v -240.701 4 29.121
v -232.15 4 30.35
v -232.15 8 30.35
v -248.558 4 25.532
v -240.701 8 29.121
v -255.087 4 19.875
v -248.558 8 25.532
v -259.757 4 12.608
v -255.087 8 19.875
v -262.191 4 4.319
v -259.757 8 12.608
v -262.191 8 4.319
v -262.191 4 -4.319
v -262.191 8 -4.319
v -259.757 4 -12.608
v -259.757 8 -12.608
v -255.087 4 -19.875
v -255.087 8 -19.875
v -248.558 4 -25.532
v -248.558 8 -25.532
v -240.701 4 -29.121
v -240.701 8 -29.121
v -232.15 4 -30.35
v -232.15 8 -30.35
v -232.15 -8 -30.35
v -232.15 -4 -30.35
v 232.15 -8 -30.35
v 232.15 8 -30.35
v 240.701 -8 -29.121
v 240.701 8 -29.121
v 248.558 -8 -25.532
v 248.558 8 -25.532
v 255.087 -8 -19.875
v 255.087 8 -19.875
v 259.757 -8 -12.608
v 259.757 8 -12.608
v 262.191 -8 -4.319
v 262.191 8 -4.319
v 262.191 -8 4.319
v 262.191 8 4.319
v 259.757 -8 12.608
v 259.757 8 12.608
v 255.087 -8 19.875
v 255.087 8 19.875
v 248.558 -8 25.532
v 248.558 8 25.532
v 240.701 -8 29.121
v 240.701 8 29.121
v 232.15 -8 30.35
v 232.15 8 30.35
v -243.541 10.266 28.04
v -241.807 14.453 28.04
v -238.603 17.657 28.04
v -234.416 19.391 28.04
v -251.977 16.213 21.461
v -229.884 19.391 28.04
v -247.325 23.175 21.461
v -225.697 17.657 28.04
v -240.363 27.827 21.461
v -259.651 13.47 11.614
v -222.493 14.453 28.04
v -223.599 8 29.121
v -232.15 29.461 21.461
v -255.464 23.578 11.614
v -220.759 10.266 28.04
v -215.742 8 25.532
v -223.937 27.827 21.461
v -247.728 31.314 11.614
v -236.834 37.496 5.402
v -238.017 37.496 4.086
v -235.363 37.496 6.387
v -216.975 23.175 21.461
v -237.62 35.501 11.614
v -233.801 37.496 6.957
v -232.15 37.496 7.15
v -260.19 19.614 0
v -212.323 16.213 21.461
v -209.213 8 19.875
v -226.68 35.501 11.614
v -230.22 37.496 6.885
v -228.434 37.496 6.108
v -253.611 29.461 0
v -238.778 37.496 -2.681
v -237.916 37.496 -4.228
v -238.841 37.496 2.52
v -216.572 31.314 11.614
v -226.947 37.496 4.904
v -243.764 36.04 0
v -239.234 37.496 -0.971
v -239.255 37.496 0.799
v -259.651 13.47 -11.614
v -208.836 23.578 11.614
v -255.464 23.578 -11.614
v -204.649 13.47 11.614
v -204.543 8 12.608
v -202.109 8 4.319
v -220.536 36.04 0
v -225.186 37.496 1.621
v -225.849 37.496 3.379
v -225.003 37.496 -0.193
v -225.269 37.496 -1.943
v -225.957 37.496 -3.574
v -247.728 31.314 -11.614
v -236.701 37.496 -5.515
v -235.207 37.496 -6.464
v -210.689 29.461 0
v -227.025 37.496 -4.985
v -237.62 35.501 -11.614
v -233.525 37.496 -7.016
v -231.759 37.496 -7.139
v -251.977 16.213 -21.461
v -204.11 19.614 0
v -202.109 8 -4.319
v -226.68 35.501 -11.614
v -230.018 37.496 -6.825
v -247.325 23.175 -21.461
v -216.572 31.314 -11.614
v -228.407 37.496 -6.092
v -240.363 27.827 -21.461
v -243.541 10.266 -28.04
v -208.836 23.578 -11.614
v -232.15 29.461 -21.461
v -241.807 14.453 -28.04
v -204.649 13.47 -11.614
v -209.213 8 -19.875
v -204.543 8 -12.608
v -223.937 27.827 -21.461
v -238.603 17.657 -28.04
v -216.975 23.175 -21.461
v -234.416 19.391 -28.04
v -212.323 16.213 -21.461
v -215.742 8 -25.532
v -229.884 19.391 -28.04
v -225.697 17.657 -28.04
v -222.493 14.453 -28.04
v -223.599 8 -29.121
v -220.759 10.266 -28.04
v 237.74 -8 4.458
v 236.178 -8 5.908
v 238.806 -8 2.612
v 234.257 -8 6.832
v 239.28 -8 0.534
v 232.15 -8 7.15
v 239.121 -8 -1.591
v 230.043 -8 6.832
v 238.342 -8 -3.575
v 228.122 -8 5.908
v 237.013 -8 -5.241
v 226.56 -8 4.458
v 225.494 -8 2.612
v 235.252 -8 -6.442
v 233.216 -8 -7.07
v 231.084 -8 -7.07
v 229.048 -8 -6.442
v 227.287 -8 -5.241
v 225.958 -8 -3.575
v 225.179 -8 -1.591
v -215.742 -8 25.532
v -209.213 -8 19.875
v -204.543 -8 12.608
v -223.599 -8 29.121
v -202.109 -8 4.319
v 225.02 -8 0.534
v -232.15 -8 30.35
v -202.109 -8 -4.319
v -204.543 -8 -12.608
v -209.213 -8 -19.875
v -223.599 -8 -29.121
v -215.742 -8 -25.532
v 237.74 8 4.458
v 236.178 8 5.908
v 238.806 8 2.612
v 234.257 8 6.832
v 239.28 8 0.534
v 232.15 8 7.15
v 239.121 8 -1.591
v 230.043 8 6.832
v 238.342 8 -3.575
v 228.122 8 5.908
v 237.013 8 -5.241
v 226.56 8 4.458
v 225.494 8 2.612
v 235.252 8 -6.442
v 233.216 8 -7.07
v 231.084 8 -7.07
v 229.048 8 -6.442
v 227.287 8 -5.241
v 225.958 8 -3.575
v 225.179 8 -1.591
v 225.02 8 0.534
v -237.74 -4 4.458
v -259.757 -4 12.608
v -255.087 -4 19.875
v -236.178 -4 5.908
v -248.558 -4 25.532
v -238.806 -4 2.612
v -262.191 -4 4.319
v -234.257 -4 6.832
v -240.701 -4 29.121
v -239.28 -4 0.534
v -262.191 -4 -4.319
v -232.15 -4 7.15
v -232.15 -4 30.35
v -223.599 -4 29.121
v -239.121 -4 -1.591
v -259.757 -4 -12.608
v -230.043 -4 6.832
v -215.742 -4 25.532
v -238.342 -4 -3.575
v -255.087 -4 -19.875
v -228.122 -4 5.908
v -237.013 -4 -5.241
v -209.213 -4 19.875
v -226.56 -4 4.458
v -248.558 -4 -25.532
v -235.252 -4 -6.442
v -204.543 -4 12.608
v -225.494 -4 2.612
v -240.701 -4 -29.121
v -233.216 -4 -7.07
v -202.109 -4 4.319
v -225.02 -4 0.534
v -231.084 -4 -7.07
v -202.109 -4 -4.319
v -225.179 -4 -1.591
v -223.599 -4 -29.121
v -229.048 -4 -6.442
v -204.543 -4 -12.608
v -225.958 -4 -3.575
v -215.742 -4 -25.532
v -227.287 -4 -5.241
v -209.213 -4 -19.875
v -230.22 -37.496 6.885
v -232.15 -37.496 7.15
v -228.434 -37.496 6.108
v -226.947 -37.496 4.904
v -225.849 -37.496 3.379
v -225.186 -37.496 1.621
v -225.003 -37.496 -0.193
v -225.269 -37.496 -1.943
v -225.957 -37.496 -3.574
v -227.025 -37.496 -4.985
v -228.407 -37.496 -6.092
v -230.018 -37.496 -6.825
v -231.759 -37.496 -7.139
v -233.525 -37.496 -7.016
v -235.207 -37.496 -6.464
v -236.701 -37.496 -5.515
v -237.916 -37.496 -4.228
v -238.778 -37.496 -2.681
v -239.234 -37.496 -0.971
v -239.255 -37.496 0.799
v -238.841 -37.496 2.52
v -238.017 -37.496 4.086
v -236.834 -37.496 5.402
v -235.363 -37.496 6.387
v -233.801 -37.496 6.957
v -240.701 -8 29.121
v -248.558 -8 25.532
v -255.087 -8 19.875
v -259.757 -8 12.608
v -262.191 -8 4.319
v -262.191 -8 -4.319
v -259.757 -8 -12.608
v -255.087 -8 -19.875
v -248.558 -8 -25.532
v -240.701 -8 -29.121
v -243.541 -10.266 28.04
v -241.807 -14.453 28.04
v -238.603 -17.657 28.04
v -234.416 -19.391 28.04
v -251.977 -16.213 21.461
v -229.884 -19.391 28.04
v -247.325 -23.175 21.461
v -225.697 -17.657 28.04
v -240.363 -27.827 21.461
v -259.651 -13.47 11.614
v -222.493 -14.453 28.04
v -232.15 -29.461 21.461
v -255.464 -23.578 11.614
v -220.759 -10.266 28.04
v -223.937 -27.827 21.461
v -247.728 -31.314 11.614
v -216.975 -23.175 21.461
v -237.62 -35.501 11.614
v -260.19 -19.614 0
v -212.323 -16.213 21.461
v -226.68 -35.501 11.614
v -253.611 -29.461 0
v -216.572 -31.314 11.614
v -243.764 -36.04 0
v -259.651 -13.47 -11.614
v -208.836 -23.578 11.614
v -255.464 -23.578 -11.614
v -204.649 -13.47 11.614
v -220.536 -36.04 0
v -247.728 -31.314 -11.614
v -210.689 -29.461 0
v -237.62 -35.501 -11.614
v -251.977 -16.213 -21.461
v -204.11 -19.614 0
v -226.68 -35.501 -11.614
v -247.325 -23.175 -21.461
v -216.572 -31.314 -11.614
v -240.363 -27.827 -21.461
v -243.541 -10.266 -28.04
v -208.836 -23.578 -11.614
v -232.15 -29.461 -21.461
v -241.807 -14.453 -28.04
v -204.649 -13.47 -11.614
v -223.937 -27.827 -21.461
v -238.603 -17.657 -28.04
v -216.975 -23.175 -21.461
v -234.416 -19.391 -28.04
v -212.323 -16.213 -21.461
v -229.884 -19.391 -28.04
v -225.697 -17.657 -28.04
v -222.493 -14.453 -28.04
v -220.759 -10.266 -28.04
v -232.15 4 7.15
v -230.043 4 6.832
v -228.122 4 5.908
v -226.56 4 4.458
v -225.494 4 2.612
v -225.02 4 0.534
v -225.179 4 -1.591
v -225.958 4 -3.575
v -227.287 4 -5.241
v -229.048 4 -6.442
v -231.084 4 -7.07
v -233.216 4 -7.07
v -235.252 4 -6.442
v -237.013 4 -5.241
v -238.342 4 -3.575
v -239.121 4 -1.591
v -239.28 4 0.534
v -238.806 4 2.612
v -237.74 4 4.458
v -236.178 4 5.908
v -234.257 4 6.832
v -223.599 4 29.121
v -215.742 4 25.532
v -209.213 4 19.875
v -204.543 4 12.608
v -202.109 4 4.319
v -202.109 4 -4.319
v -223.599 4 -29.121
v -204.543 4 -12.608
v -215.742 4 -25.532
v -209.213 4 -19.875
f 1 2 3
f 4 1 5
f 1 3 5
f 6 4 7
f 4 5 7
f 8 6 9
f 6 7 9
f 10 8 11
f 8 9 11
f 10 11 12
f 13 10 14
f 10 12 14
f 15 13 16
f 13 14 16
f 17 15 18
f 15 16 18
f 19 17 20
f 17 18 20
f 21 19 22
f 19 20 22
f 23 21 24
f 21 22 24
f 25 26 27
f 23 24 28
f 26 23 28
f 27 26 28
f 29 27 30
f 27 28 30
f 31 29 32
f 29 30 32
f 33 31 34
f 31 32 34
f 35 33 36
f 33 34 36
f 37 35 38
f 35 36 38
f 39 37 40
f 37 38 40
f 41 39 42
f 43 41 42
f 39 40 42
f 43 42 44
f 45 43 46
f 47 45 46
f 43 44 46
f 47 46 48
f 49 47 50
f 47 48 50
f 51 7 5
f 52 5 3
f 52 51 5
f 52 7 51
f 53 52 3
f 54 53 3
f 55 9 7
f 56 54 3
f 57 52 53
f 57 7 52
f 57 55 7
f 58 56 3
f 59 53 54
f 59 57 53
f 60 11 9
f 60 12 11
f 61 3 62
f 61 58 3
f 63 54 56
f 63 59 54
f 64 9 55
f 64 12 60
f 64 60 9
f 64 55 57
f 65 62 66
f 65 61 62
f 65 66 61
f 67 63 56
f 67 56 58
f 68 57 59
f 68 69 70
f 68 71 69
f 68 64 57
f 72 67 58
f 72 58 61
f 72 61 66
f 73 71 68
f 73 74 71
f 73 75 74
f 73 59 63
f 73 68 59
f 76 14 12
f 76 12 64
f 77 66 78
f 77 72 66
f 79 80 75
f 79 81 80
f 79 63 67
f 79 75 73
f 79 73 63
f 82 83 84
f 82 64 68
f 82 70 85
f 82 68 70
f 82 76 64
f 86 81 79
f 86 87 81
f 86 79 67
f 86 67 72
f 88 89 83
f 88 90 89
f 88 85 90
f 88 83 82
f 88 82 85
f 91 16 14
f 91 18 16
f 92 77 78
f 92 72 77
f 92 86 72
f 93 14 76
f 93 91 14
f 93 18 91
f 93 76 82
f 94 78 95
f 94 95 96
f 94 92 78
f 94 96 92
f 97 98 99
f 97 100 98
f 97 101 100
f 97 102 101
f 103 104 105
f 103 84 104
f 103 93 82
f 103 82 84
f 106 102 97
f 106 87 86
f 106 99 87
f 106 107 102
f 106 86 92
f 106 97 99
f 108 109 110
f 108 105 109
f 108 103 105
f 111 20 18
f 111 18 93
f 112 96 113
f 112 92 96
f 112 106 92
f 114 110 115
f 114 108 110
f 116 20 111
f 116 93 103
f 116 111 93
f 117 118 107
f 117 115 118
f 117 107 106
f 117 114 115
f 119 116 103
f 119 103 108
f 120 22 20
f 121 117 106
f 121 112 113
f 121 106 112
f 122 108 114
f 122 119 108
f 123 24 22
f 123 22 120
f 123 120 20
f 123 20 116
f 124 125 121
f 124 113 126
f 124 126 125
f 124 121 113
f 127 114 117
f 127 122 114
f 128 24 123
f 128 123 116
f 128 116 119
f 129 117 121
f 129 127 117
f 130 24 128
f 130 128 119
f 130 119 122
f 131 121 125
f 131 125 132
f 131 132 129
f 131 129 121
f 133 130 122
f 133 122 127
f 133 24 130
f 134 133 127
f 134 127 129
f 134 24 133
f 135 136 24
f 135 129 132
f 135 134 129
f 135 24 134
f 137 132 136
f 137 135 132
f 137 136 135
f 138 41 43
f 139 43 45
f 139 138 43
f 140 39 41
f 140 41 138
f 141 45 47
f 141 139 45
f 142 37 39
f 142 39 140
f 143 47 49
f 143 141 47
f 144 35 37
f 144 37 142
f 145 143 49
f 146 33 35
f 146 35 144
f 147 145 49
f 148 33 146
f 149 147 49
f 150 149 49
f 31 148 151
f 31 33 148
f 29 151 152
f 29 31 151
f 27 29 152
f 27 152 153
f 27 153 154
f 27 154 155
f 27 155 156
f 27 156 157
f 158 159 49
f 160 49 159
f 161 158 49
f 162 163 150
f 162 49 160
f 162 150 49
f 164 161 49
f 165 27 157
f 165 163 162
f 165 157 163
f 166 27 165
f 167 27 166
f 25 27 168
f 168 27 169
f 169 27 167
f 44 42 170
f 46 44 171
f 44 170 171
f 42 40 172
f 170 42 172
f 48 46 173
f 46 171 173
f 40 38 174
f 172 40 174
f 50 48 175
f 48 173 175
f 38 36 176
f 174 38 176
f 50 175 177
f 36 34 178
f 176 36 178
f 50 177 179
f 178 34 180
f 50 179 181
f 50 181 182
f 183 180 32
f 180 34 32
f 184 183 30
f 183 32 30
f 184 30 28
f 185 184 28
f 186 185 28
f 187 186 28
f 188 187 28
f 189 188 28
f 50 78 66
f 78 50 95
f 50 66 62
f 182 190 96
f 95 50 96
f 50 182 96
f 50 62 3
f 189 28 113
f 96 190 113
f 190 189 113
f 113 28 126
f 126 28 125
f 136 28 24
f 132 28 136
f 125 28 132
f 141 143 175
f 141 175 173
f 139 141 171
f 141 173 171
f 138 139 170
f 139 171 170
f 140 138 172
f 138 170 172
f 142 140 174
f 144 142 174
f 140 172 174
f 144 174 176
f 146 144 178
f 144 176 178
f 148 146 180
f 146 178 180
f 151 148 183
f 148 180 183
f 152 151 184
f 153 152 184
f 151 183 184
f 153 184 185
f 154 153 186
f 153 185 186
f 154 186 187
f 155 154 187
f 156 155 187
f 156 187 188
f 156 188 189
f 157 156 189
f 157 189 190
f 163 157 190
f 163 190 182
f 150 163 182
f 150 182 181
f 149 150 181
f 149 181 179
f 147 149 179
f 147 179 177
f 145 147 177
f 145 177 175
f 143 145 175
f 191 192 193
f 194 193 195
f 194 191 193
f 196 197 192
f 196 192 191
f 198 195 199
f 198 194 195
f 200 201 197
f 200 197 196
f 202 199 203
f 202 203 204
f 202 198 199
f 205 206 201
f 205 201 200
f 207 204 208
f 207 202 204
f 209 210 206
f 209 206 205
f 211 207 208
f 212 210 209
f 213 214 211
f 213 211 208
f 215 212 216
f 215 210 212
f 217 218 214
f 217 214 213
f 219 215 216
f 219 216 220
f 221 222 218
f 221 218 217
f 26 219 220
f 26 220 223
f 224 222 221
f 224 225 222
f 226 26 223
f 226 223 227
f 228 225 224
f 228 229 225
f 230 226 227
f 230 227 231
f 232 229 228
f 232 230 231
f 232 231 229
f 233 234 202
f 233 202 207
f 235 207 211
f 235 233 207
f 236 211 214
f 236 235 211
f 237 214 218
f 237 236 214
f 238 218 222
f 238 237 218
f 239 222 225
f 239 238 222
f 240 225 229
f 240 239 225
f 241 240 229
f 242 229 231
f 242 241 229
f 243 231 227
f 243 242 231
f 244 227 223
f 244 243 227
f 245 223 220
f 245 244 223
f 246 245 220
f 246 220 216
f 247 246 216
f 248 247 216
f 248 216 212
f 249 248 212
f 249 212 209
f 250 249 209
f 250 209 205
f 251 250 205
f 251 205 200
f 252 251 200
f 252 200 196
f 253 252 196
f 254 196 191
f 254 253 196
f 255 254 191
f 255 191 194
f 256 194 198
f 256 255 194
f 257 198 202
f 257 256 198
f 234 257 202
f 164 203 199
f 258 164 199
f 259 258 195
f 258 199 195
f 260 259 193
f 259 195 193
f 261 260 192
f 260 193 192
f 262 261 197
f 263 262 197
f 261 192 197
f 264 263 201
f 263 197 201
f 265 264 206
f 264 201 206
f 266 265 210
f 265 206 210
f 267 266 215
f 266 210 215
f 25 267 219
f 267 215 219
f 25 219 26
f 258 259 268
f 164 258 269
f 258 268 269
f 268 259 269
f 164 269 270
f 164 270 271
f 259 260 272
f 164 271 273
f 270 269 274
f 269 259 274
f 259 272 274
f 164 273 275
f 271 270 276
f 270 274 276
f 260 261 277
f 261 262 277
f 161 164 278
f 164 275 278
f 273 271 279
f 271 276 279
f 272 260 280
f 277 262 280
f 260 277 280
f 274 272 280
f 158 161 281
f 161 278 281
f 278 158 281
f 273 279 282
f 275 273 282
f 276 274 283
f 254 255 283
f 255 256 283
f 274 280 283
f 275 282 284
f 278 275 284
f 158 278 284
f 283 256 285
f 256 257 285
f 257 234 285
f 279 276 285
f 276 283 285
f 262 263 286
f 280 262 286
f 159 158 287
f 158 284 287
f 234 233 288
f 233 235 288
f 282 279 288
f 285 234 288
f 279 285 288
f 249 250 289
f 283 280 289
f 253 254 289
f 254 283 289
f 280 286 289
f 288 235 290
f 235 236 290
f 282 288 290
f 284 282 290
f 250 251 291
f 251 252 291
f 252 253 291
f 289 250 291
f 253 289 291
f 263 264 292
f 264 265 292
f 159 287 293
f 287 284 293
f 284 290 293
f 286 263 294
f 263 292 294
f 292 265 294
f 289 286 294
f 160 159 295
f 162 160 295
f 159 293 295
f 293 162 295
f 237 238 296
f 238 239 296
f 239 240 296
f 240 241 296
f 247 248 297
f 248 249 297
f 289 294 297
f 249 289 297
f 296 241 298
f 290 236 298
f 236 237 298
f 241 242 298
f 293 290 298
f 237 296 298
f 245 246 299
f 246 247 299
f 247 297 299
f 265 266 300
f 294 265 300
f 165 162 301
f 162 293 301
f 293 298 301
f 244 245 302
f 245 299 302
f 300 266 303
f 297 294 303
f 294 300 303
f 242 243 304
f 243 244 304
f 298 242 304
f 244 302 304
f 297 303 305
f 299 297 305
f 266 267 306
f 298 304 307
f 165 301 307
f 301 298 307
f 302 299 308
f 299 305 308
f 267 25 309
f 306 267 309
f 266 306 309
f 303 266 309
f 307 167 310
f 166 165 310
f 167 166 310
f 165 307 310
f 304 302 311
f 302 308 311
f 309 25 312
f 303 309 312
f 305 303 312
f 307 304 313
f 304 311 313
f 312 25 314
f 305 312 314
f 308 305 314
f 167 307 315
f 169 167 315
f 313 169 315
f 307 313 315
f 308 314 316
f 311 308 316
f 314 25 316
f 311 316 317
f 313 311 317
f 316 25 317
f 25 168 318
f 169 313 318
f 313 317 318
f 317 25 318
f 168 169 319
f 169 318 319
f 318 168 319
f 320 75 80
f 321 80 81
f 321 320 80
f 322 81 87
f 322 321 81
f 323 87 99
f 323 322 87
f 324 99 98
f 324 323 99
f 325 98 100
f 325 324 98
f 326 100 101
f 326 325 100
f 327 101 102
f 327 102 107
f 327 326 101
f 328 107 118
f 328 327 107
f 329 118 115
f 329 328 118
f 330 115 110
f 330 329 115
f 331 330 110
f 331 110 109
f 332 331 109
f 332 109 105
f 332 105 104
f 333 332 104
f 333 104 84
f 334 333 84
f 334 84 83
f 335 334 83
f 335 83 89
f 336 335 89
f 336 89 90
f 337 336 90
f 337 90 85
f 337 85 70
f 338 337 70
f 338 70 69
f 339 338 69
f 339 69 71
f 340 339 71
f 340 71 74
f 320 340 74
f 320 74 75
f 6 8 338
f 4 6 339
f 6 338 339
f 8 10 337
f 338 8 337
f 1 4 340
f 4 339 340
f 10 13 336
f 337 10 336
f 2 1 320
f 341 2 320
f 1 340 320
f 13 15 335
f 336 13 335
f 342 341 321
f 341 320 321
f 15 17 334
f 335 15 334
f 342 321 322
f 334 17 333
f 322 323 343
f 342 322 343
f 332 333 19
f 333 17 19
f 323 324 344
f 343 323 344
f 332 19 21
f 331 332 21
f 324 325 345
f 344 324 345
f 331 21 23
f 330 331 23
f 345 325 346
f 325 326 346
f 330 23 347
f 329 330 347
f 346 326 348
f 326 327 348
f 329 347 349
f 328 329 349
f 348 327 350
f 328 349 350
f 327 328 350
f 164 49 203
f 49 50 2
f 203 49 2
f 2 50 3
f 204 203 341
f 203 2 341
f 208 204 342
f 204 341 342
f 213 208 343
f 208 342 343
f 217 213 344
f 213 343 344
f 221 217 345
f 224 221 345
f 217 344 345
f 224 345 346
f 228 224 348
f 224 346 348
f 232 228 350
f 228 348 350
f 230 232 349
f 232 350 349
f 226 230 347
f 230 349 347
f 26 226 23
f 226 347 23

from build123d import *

# Parameters (mm, degrees)
BOSS_EXTRU_1_DEPTH           = 8
ESQUISSE2_R                  = 7.15
ENL_V_MAT_EXTRU_1_DEPTH      = 265.732643435
R_VOLUTION1_ANGLE            = 180
ESQUISSE4_R                  = 30.35
ENL_V_MAT_EXTRU_2_DEPTH      = 4
ENL_V_MAT_EXTRU_3_DEPTH      = 268.017031292
ENL_V_MAT_EXTRU_3_DEPTH_BACK = 268.017031292
ESQUISSE5_R                  = 7.15


with BuildPart() as part:
    # Esquisse1 → Boss.-Extru.1 (new, symmetric)
    with BuildSketch(Plane(origin=(0, 0, 0), x_dir=(1, 0, 0), z_dir=(0, 1, 0))):
        with BuildLine():
            Line((-232.15, 30.35), (232.15, 30.35))
            ThreePointArc((232.15, 30.35), (262.5, 0), (232.15, -30.35))
            Line((232.15, -30.35), (-232.15, -30.35))
            ThreePointArc((-232.15, -30.35), (-262.5, 0), (-232.15, 30.35))
        make_face()
    extrude(amount=BOSS_EXTRU_1_DEPTH, both=True)

    # Esquisse2 → Enlèv. mat.-Extru.1 (cut, through all)
    with BuildSketch(Plane(origin=(0, 8, 0), x_dir=(1, 0, 0), z_dir=(0, 1, 0))):
        with Locations(Location((232.15, 0, 0), (0, 0, 270))):
            Circle(ESQUISSE2_R)
    extrude(amount=-ENL_V_MAT_EXTRU_1_DEPTH, mode=Mode.SUBTRACT)

    # Esquisse3 → Révolution1 (revolve)
    with BuildSketch(Plane(origin=(0, 8, 0), x_dir=(1, 0, 0), z_dir=(0, 1, 0))):
        with BuildLine():
            Line((-232.15, 30.35), (-232.15, -30.35))
            ThreePointArc((-232.15, -30.35), (-262.5, 0), (-232.15, 30.35))
        make_face()
    r_volution1 = revolve(axis=Axis((-232.15, 8, -30.35), (0, 0, -1)), revolution_arc=R_VOLUTION1_ANGLE)

    # Symétrie1: Révolution1 across plane
    add(r_volution1.mirror(Plane.ZX))

    # Esquisse4 → Enlèv. mat.-Extru.2 (cut, symmetric)
    with BuildSketch(Plane(origin=(0, 0, 0), x_dir=(1, 0, 0), z_dir=(0, 1, 0))):
        with Locations((-232.15, 0)):
            Circle(ESQUISSE4_R)
    extrude(amount=ENL_V_MAT_EXTRU_2_DEPTH, both=True, mode=Mode.SUBTRACT)

    # Esquisse5 → Enlèv. mat.-Extru.3 (cut, two sides: drawn at the far end of the back side and taken through both)
    with BuildSketch(Plane(origin=(0, 0, 0), x_dir=(1, 0, 0), z_dir=(0, 1, 0)).offset(-ENL_V_MAT_EXTRU_3_DEPTH_BACK)):
        with Locations(Location((-232.15, 0, 0), (0, 0, 270))):
            Circle(ESQUISSE5_R)
    extrude(amount=ENL_V_MAT_EXTRU_3_DEPTH + ENL_V_MAT_EXTRU_3_DEPTH_BACK, mode=Mode.SUBTRACT)


solid = part.part
